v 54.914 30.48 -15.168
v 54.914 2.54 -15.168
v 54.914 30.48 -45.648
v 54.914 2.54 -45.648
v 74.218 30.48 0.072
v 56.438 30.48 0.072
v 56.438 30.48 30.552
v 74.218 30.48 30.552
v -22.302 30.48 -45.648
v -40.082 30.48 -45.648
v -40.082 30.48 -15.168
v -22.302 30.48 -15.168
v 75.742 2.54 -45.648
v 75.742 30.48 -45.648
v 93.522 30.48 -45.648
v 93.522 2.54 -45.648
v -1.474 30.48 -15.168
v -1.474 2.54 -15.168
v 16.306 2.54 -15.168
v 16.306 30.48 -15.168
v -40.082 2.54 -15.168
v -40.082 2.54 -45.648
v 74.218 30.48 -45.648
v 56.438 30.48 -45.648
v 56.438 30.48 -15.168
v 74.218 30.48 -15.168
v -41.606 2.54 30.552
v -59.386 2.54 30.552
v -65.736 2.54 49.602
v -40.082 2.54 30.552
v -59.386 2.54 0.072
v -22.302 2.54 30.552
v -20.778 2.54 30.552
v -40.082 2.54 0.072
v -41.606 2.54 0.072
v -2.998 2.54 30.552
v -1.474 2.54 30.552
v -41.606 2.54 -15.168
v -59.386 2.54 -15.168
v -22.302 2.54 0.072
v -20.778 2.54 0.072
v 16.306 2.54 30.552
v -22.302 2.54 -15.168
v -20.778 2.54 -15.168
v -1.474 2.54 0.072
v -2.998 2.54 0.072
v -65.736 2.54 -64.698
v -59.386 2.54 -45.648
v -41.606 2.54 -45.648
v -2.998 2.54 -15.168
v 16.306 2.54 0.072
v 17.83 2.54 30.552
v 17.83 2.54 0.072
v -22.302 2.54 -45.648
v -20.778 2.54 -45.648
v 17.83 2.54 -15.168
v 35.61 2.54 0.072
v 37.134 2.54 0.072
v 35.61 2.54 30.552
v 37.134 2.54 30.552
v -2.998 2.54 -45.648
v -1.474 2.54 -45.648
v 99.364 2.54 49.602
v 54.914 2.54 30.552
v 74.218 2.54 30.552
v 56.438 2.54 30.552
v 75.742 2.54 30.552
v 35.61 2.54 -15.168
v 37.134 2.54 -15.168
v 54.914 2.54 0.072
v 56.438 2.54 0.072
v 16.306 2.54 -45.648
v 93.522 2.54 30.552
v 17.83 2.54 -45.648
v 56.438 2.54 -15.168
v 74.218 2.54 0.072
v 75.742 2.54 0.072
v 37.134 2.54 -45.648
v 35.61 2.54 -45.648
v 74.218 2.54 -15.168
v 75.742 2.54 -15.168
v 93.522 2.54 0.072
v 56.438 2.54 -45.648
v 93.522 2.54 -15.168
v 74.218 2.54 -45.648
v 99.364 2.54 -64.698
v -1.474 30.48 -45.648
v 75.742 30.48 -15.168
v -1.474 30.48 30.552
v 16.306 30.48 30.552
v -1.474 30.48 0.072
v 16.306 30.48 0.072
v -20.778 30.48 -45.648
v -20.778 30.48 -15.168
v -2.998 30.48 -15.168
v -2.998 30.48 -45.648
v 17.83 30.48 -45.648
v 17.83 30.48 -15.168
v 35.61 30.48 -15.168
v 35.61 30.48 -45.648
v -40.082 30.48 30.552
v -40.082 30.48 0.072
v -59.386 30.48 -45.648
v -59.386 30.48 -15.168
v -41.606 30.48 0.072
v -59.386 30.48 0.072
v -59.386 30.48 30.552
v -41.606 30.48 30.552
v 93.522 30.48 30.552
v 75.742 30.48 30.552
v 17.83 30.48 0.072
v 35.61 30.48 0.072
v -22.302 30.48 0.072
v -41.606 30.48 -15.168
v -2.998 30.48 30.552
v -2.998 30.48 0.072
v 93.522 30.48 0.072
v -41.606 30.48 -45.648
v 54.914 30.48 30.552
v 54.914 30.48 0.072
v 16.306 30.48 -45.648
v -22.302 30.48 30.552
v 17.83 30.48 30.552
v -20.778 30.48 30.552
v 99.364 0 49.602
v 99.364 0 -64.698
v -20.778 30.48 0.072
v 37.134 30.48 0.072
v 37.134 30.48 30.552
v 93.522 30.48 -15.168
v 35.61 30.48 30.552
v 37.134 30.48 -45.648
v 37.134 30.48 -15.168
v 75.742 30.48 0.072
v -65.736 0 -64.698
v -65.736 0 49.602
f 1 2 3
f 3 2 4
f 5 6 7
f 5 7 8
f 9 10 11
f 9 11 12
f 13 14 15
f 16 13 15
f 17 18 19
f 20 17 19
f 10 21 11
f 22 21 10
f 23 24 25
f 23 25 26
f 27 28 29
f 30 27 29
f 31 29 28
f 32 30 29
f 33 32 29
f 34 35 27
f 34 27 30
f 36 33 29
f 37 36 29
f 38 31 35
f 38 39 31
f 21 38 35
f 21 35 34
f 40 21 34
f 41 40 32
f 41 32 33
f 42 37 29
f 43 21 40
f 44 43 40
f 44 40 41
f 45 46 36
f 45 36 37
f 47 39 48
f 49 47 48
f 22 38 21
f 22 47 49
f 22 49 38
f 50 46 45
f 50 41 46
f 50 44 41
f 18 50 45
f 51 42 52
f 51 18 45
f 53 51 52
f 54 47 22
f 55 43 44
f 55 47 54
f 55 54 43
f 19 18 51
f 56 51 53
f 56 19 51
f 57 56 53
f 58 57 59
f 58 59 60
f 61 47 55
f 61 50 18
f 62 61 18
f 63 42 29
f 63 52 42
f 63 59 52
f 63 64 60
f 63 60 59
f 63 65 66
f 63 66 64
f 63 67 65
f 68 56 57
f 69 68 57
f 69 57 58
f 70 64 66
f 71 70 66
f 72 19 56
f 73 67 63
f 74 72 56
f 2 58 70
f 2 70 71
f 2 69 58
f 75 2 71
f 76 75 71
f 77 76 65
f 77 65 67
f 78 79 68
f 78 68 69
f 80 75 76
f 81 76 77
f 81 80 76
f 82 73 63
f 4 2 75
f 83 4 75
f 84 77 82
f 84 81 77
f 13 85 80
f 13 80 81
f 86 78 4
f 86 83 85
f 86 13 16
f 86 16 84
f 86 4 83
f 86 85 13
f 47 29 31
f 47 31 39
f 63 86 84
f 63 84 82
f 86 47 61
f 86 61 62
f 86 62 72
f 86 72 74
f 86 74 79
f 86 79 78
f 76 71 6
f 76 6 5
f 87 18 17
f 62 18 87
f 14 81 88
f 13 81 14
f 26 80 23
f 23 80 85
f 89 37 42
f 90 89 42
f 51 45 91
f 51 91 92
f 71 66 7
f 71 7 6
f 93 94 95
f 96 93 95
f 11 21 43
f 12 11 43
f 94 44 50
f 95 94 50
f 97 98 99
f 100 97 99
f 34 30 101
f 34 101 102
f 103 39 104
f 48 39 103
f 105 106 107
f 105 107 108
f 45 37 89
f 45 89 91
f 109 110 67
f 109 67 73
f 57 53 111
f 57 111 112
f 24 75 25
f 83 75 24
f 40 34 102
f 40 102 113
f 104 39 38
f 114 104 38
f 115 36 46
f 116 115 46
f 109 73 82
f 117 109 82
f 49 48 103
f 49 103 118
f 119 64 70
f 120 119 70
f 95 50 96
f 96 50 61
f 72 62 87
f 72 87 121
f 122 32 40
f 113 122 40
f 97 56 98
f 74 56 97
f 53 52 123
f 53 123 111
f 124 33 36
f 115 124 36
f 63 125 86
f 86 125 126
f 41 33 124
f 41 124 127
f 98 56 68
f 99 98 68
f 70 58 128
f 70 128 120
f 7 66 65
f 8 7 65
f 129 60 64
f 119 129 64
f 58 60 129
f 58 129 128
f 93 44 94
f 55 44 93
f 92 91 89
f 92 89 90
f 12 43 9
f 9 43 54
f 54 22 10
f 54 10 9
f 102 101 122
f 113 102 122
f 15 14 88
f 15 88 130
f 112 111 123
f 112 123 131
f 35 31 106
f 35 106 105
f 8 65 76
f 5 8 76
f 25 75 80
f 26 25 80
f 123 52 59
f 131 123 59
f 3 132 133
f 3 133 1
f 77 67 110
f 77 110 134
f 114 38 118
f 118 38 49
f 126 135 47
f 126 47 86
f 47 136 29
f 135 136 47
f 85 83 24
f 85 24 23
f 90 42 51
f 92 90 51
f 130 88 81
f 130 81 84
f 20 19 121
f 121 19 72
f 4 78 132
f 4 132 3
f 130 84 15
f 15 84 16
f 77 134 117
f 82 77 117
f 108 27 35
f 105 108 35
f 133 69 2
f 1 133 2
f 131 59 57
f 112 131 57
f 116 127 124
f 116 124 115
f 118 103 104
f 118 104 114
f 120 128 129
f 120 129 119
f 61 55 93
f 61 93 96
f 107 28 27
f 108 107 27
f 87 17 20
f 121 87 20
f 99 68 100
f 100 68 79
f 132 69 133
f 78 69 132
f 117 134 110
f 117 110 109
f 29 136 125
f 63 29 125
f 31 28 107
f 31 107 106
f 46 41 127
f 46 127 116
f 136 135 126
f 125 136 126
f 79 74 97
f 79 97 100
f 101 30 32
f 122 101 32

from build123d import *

# Parameters (mm, degrees)
SKETCH1_W           = 165.1
SKETCH1_H           = 114.3
BOSS_EXTRUDE1_DEPTH = 2.54
SKETCH2_W           = 17.78
SKETCH2_H           = 30.48
BOSS_EXTRUDE2_DEPTH = 27.94


with BuildPart() as part:
    # Sketch1 → Boss-Extrude1 (new body)
    with BuildSketch(Plane(origin=(0, 0, 0), x_dir=(1, 0, 0), z_dir=(0, 1, 0))):
        with Locations((16.813522013, 7.548113208)):
            Rectangle(SKETCH1_W, SKETCH1_H)
    extrude(amount=BOSS_EXTRUDE1_DEPTH)

    # Sketch2 → Boss-Extrude2 (add)
    with BuildSketch(Plane(origin=(0, 2.54, 0), x_dir=(1, 0, 0), z_dir=(0, 1, 0))):
        with Locations((65.327522013, 30.408113208)):
            Rectangle(SKETCH2_W, SKETCH2_H)
        with Locations((84.631522013, 30.408113208)):
            Rectangle(SKETCH2_W, SKETCH2_H)
        with Locations((46.023522013, 30.408113208)):
            Rectangle(SKETCH2_W, SKETCH2_H)
        with Locations((26.719522013, 30.408113208)):
            Rectangle(SKETCH2_W, SKETCH2_H)
        with Locations((7.415522013, 30.408113208)):
            Rectangle(SKETCH2_W, SKETCH2_H)
        with Locations((-11.888477987, 30.408113208)):
            Rectangle(SKETCH2_W, SKETCH2_H)
        with Locations((-31.192477987, 30.408113208)):
            Rectangle(SKETCH2_W, SKETCH2_H)
        with Locations((-50.496477987, 30.408113208)):
            Rectangle(SKETCH2_W, SKETCH2_H)
        with Locations((65.327522013, -15.311886792)):
            Rectangle(SKETCH2_W, SKETCH2_H)
        with Locations((46.023522013, -15.311886792)):
            Rectangle(SKETCH2_W, SKETCH2_H)
        with Locations((26.719522013, -15.311886792)):
            Rectangle(SKETCH2_W, SKETCH2_H)
        with Locations((7.415522013, -15.311886792)):
            Rectangle(SKETCH2_W, SKETCH2_H)
        with Locations((-11.888477987, -15.311886792)):
            Rectangle(SKETCH2_W, SKETCH2_H)
        with Locations((-31.192477987, -15.311886792)):
            Rectangle(SKETCH2_W, SKETCH2_H)
        with Locations((-50.496477987, -15.311886792)):
            Rectangle(SKETCH2_W, SKETCH2_H)
        with Locations((84.631522013, -15.311886792)):
            Rectangle(SKETCH2_W, SKETCH2_H)
    extrude(amount=BOSS_EXTRUDE2_DEPTH)


solid = part.part
